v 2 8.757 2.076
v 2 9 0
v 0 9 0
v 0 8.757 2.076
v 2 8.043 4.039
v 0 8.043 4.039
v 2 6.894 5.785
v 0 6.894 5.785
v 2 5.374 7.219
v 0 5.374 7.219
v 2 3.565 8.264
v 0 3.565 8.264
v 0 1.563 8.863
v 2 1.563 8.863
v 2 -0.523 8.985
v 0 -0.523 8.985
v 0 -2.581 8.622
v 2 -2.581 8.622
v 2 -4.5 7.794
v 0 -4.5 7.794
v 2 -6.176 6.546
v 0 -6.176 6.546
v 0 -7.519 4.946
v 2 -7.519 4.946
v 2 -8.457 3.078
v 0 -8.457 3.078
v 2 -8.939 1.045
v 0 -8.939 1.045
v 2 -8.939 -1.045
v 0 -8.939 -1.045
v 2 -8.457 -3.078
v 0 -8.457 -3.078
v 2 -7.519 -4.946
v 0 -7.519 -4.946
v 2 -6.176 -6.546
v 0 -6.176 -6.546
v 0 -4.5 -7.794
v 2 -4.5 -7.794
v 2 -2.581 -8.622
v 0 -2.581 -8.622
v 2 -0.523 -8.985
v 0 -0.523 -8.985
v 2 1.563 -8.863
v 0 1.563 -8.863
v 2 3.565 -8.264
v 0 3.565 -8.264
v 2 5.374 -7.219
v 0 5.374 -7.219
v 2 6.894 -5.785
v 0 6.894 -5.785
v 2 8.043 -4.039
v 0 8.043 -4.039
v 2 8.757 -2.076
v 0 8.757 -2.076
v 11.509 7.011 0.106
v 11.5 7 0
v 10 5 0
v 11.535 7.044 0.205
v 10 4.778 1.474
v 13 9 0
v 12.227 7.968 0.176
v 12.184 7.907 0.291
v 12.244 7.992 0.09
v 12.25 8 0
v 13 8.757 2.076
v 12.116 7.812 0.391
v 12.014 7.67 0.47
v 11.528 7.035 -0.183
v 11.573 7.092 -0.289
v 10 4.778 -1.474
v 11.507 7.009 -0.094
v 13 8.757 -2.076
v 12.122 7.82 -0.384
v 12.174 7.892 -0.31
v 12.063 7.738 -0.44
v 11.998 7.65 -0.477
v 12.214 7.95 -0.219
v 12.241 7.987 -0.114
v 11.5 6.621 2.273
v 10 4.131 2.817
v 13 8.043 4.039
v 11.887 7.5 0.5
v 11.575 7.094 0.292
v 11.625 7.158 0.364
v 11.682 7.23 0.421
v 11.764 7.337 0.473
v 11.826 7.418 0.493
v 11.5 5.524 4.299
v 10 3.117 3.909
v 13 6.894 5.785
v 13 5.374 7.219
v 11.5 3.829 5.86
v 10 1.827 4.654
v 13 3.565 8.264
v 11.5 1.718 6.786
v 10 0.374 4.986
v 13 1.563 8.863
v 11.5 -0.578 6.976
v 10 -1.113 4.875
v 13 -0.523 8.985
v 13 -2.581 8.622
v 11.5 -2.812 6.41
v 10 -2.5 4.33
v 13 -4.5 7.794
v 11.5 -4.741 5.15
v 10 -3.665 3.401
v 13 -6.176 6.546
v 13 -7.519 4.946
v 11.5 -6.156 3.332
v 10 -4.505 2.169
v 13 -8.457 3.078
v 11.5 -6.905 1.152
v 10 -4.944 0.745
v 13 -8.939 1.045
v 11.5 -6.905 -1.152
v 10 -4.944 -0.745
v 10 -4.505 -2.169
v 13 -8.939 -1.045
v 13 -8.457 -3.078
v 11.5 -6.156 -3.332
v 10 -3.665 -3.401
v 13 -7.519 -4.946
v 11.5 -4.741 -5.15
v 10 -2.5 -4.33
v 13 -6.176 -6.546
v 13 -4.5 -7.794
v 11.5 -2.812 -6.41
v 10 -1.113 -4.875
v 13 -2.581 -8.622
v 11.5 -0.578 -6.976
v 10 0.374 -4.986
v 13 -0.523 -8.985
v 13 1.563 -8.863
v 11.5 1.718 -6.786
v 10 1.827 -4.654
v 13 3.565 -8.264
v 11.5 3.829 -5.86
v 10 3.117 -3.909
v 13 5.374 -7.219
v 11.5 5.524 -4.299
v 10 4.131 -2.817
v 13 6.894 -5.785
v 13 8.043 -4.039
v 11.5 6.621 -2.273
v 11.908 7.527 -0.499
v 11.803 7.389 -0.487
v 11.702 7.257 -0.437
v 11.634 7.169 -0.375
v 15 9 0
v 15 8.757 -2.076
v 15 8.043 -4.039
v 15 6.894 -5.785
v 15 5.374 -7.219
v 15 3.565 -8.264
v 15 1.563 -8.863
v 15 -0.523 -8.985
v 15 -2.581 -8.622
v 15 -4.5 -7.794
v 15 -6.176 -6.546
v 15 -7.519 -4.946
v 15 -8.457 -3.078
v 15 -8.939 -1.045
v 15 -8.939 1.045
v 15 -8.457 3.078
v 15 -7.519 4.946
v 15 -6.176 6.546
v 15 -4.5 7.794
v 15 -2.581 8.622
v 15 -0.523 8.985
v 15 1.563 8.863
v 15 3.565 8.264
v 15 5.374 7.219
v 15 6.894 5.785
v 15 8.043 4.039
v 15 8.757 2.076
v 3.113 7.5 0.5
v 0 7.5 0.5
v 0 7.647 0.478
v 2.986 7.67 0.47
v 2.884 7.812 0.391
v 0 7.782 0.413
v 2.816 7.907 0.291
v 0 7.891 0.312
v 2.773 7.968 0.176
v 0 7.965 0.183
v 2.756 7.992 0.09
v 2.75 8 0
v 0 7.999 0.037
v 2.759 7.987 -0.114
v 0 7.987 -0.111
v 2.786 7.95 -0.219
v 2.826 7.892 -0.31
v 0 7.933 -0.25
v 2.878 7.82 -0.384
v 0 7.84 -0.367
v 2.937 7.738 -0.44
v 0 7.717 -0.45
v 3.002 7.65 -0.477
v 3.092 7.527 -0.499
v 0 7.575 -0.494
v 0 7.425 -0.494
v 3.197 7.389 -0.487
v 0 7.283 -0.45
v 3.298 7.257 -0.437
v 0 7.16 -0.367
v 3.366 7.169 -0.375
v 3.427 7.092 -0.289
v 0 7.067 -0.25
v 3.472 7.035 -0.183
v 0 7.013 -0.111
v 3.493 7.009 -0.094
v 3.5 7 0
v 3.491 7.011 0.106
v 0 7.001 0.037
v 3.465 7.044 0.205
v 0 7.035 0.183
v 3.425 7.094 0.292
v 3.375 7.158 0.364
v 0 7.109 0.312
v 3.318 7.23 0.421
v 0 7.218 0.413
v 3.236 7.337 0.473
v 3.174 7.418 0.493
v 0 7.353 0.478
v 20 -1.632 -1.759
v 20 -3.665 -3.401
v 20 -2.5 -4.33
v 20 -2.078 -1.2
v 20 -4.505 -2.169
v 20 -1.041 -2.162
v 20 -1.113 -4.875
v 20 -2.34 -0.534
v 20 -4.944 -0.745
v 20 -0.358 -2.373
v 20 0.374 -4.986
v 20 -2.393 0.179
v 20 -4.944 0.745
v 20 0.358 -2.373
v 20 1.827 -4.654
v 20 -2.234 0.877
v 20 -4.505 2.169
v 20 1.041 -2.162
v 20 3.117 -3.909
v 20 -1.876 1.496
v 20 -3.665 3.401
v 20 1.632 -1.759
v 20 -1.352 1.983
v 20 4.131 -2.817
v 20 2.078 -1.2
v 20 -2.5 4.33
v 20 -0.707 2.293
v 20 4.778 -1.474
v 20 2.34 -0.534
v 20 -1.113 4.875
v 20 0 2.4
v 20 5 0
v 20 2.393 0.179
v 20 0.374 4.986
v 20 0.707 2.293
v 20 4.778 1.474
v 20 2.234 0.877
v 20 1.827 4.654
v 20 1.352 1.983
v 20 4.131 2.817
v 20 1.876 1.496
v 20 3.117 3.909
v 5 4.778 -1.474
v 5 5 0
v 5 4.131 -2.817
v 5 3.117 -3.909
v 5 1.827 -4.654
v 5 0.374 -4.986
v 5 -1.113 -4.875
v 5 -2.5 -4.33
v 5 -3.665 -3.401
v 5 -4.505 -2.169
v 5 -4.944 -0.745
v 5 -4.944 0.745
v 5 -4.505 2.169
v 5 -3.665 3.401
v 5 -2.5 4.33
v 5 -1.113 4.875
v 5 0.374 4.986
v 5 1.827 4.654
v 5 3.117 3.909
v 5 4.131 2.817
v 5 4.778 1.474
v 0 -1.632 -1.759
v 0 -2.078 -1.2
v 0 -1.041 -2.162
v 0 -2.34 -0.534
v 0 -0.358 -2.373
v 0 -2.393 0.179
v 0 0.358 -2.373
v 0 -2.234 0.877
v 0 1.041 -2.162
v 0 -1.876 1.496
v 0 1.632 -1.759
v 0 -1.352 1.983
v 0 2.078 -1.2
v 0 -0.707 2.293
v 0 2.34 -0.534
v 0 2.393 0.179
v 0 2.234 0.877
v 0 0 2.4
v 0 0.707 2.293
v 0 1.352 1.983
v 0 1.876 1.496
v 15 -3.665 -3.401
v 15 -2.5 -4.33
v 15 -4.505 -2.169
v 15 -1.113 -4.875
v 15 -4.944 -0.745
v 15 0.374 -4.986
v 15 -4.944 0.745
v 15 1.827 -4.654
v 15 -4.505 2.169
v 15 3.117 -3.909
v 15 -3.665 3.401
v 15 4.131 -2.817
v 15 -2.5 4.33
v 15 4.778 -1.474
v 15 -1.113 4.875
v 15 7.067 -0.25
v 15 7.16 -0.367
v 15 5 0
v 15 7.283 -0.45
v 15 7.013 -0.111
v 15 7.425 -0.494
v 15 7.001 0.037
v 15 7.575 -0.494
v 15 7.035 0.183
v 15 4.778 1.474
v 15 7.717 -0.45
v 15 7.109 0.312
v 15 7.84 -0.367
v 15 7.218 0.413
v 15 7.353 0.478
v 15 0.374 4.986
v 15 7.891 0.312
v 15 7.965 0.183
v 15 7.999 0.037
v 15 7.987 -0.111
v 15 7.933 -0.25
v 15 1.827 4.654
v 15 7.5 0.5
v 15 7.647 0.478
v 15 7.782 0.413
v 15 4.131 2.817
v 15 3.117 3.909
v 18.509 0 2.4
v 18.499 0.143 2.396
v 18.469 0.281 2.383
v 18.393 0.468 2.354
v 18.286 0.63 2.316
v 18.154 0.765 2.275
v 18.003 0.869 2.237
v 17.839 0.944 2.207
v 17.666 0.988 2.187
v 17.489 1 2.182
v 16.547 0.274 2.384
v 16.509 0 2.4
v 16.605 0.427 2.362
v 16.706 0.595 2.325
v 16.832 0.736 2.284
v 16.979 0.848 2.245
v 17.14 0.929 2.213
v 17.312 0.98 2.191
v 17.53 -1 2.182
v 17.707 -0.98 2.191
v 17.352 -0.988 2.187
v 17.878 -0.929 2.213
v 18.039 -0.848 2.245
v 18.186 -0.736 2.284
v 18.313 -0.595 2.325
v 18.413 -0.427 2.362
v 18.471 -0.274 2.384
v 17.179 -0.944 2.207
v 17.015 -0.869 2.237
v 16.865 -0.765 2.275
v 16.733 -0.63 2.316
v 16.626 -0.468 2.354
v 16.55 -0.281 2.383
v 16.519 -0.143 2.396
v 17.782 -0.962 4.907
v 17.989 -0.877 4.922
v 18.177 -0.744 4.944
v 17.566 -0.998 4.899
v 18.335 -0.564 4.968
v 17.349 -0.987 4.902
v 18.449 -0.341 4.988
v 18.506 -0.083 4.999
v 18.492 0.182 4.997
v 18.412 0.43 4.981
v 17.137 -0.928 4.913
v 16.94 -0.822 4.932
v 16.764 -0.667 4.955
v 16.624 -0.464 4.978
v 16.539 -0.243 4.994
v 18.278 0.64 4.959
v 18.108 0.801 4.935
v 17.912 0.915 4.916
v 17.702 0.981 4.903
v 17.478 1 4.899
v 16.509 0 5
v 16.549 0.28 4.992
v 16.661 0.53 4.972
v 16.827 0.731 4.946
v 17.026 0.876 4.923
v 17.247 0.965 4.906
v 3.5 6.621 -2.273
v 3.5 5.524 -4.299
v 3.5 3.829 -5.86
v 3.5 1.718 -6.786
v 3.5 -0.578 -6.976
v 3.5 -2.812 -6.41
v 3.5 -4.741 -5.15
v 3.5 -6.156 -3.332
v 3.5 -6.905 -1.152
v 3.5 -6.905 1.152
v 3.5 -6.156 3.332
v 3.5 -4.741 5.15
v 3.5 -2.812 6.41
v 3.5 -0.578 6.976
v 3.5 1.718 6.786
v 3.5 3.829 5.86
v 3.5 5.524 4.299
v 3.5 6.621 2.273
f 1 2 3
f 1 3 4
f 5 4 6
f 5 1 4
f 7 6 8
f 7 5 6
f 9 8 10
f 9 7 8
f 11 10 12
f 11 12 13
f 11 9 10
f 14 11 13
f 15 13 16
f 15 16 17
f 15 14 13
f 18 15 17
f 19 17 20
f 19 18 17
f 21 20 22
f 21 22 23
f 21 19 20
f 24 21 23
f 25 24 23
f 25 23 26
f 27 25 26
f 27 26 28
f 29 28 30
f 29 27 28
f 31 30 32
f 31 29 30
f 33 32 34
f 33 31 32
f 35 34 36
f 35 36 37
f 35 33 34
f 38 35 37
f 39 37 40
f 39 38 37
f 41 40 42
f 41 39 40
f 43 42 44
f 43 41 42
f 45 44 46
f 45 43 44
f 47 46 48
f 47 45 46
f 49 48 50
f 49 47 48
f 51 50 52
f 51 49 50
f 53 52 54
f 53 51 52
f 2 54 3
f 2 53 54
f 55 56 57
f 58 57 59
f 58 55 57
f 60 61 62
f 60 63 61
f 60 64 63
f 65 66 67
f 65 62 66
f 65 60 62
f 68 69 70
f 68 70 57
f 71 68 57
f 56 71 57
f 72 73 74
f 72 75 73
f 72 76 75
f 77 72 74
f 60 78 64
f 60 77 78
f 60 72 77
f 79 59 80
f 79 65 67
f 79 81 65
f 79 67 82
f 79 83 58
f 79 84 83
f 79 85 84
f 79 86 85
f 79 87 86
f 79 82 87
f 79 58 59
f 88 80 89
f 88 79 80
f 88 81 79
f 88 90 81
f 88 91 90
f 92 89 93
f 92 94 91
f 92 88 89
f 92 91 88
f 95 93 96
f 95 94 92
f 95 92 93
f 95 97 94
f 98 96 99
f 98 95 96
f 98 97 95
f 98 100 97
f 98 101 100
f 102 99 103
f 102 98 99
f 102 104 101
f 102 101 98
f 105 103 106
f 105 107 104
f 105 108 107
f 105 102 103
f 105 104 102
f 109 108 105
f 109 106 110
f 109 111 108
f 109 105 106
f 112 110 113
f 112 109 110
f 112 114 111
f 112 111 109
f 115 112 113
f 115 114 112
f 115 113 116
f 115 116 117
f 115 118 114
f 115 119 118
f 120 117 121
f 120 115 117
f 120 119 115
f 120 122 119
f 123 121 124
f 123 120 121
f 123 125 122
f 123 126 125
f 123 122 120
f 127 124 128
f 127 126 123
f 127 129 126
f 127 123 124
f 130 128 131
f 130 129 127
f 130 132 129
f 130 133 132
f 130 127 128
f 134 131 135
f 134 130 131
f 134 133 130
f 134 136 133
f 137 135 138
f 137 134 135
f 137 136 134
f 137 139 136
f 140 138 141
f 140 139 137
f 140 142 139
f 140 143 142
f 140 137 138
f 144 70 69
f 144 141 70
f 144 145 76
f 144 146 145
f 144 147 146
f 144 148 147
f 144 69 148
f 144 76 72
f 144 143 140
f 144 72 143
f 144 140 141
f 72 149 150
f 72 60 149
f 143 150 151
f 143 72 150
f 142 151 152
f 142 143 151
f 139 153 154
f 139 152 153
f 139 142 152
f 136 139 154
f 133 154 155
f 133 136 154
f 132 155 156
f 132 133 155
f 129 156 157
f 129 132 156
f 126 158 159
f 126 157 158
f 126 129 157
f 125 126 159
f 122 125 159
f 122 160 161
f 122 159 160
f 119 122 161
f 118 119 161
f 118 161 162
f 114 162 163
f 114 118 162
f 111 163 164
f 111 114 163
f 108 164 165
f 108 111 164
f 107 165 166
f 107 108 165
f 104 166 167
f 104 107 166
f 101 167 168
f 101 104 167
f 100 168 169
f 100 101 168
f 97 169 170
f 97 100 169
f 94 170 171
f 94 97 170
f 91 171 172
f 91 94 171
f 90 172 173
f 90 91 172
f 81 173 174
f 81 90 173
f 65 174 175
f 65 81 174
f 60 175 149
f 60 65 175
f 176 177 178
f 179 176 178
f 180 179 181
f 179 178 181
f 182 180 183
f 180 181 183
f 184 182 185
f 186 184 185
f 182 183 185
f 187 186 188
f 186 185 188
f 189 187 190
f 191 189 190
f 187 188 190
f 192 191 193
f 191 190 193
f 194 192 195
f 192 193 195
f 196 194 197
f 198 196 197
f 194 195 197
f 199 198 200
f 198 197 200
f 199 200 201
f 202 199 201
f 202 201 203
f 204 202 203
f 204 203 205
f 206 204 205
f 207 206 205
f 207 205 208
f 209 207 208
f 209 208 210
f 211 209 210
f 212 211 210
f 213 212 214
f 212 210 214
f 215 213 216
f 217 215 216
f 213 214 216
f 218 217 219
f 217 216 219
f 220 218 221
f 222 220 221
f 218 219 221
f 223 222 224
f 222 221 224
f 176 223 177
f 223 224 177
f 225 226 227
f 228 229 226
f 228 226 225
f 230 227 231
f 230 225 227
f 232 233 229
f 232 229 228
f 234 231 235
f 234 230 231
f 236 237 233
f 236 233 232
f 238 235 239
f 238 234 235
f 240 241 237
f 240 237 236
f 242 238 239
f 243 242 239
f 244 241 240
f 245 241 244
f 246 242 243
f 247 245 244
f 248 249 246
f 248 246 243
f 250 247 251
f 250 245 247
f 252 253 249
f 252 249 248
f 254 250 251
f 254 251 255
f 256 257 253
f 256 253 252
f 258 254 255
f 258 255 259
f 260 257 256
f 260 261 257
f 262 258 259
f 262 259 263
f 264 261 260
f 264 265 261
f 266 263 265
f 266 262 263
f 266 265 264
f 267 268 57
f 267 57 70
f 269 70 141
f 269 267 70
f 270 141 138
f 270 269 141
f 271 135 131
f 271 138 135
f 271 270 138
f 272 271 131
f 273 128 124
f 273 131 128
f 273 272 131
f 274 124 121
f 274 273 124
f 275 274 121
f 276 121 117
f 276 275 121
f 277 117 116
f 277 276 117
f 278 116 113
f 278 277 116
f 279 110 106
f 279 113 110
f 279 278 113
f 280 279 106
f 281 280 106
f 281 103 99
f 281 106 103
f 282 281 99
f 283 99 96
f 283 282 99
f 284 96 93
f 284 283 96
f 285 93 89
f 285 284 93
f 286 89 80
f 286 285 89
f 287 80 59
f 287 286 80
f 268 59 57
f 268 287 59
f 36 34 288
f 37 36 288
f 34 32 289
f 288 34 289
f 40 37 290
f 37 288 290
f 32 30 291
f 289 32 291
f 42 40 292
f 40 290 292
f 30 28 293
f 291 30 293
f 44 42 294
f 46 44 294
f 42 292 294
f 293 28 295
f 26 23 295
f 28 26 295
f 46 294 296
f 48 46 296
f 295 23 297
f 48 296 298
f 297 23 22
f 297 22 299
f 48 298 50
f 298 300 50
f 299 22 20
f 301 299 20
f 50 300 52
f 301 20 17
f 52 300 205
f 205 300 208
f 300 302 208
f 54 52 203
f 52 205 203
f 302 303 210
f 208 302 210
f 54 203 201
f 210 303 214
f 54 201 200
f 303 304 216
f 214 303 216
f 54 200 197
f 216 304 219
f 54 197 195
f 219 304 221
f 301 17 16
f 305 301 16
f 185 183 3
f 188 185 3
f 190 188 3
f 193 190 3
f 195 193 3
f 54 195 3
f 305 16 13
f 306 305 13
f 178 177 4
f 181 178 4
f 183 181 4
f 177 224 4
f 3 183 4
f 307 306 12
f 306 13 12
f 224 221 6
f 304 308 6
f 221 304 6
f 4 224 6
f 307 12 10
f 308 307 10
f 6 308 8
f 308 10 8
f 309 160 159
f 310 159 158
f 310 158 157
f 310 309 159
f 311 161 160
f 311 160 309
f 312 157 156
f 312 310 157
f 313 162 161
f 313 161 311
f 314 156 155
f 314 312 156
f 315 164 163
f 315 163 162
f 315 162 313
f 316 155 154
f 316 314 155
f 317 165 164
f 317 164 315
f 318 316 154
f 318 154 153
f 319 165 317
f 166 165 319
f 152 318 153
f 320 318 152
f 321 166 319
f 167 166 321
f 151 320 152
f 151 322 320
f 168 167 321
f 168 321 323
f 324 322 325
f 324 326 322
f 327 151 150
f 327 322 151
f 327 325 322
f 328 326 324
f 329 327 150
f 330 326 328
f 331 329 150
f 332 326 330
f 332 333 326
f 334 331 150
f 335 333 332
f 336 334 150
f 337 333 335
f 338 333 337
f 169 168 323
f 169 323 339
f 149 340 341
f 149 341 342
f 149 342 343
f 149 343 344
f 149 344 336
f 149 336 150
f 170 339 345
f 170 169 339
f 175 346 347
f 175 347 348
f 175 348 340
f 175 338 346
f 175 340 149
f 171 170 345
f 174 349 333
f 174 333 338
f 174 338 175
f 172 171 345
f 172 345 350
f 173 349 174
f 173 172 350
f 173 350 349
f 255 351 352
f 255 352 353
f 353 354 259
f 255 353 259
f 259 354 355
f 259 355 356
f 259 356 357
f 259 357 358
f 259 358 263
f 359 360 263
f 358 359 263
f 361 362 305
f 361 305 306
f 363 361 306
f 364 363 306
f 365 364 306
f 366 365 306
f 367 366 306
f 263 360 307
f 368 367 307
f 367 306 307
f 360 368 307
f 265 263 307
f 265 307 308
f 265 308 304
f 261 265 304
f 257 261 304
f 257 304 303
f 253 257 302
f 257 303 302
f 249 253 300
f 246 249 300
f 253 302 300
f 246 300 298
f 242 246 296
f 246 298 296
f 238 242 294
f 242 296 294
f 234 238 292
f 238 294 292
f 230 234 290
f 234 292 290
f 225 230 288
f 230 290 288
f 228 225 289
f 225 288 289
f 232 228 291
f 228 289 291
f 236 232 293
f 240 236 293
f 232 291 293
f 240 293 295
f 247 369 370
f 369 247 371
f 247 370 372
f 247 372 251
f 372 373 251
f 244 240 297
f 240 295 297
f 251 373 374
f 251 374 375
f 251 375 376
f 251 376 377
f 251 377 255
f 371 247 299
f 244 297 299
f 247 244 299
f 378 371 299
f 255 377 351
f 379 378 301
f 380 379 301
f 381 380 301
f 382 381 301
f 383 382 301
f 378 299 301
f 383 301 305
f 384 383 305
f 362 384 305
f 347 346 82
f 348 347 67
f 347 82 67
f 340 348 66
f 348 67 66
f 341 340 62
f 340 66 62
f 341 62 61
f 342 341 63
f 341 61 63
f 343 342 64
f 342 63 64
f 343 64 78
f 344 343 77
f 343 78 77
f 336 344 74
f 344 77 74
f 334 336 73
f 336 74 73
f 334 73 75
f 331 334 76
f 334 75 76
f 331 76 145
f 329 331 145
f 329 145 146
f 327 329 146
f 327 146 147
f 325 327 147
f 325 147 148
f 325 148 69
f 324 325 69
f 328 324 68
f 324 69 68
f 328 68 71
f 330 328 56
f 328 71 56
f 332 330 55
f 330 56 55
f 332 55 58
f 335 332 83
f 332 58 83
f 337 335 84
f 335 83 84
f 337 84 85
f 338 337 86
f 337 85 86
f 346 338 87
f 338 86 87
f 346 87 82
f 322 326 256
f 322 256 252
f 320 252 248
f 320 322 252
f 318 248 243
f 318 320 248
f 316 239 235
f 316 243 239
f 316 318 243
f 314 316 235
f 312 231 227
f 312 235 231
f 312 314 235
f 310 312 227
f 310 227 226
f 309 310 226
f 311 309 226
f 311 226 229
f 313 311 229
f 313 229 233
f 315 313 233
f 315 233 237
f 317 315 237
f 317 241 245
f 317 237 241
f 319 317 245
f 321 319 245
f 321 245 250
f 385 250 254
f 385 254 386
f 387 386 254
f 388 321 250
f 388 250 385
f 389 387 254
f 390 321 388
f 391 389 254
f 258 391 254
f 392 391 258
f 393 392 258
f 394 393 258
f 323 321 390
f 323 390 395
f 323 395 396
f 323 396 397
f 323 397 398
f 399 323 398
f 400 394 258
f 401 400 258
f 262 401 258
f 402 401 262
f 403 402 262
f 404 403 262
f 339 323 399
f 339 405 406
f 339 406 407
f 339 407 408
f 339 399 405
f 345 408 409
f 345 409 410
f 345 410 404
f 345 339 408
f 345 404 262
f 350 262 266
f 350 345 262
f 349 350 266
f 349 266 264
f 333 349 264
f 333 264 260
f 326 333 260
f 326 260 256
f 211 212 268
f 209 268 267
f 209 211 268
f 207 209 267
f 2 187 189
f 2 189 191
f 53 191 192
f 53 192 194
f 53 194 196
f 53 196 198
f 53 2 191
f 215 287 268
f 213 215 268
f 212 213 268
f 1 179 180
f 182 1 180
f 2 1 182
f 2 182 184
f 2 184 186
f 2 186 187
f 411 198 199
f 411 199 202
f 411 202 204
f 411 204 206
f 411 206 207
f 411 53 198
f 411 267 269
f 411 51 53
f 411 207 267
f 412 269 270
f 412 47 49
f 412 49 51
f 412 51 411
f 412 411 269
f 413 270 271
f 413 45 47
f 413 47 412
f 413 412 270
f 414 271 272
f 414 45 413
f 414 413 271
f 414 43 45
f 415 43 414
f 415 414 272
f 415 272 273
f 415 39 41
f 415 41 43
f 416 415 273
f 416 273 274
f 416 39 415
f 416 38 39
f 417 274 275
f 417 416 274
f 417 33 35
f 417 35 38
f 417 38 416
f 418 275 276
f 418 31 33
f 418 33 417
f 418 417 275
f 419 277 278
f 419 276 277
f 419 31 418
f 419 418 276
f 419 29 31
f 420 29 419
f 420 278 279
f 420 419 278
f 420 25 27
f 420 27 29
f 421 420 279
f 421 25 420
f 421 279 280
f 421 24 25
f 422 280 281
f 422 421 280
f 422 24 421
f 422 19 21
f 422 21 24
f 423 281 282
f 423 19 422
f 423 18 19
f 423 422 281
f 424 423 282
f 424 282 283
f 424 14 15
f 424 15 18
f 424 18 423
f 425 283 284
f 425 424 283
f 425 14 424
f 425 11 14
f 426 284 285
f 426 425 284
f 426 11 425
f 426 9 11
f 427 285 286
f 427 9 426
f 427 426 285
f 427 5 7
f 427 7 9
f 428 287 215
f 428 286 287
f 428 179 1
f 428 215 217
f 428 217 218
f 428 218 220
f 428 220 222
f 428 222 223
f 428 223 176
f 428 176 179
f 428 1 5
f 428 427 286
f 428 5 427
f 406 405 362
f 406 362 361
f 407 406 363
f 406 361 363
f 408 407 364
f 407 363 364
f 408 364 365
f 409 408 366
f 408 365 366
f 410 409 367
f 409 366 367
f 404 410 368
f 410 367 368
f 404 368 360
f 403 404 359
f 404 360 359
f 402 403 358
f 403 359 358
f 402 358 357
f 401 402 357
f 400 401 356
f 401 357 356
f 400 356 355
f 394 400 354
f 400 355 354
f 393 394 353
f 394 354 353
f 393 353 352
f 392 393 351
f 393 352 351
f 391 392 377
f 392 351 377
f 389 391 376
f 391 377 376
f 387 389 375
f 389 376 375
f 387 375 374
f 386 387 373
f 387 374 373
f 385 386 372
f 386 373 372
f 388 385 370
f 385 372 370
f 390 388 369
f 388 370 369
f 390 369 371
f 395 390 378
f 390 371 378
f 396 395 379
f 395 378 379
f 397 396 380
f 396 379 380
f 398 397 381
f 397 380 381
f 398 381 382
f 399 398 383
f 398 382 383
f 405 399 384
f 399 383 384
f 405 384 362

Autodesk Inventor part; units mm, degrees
ref_plane "YZ Plane" through (0, 0, 0) normal (1, 0, 0) x (0, 1, 0)
ref_plane "XZ Plane" through (0, 0, 0) normal (0, 1, 0) x (-1, 0, 0)
sketch "Sketch1" plane through (0, 0, 0) normal (0, 0, 1) x (1, 0, 0)
  line L0 (0, 0) -> (20, 0)
  line L1 (0, 0) -> (0, 5)
  line L2 (0, 5) -> (0, 9)
  line L3 (0, 9) -> (2, 9)
  line L4 (20, 0) -> (20, 5)
  line L5 (20, 5) -> (0, 5)
  line L6 (15, 0) -> (15, 9)
  line L7 (15, 9) -> (13, 9)
  line L8 (13, 9) -> (10, 5)
  line L9 (2, 9) -> (13, 9) construction
  line L10 (7.5, 9) -> (7.5, -5.2368) construction
  line L11 (2, 9) -> (5, 5)
  point P0 (17.5, 0)
  point P1 (15, 5)
  dimension "d0" = 20
  dimension "d2" = 5
  dimension "d3" = 4
  dimension "d4" = 2
  dimension "d9" = 9
  dimension "d10" = 5
  dimension "d11" = 2
  dimension "d12" = 2.5
  dimension "d13" = 20
revolve "Revolution1" add sketch "Sketch1" angle 360 about axis through (0, 0, 0) along (1, 0, 0)
sketch "Sketch2" plane through (0, 0, 0) normal (-1, 0, 0) x (0, 0, 1)
  circle A0 centre (0, 0) radius 2.4
  circle A1 centre (0, 7.5) radius 0.5
  dimension "d15" = 4.8
  dimension "d21" = 1
  dimension "d22" = 7.5
extrude "Extrusion1" cut sketch "Sketch2" against normal blind 20
ref_plane "Work Plane1" through (20, 0, 0) normal (0, 0, -1) x (-1, 0, 0)
sketch "Sketch3" plane through (20, 0, 0) normal (0, 0, -1) x (-1, 0, 0)
  circle A0 centre (2.4908, 0) radius 1
  point P0 (20, 0)
  dimension "d18" = 2
extrude "Extrusion2" cut sketch "Sketch3" against normal blind 6
properties part number "stepper_spool"
